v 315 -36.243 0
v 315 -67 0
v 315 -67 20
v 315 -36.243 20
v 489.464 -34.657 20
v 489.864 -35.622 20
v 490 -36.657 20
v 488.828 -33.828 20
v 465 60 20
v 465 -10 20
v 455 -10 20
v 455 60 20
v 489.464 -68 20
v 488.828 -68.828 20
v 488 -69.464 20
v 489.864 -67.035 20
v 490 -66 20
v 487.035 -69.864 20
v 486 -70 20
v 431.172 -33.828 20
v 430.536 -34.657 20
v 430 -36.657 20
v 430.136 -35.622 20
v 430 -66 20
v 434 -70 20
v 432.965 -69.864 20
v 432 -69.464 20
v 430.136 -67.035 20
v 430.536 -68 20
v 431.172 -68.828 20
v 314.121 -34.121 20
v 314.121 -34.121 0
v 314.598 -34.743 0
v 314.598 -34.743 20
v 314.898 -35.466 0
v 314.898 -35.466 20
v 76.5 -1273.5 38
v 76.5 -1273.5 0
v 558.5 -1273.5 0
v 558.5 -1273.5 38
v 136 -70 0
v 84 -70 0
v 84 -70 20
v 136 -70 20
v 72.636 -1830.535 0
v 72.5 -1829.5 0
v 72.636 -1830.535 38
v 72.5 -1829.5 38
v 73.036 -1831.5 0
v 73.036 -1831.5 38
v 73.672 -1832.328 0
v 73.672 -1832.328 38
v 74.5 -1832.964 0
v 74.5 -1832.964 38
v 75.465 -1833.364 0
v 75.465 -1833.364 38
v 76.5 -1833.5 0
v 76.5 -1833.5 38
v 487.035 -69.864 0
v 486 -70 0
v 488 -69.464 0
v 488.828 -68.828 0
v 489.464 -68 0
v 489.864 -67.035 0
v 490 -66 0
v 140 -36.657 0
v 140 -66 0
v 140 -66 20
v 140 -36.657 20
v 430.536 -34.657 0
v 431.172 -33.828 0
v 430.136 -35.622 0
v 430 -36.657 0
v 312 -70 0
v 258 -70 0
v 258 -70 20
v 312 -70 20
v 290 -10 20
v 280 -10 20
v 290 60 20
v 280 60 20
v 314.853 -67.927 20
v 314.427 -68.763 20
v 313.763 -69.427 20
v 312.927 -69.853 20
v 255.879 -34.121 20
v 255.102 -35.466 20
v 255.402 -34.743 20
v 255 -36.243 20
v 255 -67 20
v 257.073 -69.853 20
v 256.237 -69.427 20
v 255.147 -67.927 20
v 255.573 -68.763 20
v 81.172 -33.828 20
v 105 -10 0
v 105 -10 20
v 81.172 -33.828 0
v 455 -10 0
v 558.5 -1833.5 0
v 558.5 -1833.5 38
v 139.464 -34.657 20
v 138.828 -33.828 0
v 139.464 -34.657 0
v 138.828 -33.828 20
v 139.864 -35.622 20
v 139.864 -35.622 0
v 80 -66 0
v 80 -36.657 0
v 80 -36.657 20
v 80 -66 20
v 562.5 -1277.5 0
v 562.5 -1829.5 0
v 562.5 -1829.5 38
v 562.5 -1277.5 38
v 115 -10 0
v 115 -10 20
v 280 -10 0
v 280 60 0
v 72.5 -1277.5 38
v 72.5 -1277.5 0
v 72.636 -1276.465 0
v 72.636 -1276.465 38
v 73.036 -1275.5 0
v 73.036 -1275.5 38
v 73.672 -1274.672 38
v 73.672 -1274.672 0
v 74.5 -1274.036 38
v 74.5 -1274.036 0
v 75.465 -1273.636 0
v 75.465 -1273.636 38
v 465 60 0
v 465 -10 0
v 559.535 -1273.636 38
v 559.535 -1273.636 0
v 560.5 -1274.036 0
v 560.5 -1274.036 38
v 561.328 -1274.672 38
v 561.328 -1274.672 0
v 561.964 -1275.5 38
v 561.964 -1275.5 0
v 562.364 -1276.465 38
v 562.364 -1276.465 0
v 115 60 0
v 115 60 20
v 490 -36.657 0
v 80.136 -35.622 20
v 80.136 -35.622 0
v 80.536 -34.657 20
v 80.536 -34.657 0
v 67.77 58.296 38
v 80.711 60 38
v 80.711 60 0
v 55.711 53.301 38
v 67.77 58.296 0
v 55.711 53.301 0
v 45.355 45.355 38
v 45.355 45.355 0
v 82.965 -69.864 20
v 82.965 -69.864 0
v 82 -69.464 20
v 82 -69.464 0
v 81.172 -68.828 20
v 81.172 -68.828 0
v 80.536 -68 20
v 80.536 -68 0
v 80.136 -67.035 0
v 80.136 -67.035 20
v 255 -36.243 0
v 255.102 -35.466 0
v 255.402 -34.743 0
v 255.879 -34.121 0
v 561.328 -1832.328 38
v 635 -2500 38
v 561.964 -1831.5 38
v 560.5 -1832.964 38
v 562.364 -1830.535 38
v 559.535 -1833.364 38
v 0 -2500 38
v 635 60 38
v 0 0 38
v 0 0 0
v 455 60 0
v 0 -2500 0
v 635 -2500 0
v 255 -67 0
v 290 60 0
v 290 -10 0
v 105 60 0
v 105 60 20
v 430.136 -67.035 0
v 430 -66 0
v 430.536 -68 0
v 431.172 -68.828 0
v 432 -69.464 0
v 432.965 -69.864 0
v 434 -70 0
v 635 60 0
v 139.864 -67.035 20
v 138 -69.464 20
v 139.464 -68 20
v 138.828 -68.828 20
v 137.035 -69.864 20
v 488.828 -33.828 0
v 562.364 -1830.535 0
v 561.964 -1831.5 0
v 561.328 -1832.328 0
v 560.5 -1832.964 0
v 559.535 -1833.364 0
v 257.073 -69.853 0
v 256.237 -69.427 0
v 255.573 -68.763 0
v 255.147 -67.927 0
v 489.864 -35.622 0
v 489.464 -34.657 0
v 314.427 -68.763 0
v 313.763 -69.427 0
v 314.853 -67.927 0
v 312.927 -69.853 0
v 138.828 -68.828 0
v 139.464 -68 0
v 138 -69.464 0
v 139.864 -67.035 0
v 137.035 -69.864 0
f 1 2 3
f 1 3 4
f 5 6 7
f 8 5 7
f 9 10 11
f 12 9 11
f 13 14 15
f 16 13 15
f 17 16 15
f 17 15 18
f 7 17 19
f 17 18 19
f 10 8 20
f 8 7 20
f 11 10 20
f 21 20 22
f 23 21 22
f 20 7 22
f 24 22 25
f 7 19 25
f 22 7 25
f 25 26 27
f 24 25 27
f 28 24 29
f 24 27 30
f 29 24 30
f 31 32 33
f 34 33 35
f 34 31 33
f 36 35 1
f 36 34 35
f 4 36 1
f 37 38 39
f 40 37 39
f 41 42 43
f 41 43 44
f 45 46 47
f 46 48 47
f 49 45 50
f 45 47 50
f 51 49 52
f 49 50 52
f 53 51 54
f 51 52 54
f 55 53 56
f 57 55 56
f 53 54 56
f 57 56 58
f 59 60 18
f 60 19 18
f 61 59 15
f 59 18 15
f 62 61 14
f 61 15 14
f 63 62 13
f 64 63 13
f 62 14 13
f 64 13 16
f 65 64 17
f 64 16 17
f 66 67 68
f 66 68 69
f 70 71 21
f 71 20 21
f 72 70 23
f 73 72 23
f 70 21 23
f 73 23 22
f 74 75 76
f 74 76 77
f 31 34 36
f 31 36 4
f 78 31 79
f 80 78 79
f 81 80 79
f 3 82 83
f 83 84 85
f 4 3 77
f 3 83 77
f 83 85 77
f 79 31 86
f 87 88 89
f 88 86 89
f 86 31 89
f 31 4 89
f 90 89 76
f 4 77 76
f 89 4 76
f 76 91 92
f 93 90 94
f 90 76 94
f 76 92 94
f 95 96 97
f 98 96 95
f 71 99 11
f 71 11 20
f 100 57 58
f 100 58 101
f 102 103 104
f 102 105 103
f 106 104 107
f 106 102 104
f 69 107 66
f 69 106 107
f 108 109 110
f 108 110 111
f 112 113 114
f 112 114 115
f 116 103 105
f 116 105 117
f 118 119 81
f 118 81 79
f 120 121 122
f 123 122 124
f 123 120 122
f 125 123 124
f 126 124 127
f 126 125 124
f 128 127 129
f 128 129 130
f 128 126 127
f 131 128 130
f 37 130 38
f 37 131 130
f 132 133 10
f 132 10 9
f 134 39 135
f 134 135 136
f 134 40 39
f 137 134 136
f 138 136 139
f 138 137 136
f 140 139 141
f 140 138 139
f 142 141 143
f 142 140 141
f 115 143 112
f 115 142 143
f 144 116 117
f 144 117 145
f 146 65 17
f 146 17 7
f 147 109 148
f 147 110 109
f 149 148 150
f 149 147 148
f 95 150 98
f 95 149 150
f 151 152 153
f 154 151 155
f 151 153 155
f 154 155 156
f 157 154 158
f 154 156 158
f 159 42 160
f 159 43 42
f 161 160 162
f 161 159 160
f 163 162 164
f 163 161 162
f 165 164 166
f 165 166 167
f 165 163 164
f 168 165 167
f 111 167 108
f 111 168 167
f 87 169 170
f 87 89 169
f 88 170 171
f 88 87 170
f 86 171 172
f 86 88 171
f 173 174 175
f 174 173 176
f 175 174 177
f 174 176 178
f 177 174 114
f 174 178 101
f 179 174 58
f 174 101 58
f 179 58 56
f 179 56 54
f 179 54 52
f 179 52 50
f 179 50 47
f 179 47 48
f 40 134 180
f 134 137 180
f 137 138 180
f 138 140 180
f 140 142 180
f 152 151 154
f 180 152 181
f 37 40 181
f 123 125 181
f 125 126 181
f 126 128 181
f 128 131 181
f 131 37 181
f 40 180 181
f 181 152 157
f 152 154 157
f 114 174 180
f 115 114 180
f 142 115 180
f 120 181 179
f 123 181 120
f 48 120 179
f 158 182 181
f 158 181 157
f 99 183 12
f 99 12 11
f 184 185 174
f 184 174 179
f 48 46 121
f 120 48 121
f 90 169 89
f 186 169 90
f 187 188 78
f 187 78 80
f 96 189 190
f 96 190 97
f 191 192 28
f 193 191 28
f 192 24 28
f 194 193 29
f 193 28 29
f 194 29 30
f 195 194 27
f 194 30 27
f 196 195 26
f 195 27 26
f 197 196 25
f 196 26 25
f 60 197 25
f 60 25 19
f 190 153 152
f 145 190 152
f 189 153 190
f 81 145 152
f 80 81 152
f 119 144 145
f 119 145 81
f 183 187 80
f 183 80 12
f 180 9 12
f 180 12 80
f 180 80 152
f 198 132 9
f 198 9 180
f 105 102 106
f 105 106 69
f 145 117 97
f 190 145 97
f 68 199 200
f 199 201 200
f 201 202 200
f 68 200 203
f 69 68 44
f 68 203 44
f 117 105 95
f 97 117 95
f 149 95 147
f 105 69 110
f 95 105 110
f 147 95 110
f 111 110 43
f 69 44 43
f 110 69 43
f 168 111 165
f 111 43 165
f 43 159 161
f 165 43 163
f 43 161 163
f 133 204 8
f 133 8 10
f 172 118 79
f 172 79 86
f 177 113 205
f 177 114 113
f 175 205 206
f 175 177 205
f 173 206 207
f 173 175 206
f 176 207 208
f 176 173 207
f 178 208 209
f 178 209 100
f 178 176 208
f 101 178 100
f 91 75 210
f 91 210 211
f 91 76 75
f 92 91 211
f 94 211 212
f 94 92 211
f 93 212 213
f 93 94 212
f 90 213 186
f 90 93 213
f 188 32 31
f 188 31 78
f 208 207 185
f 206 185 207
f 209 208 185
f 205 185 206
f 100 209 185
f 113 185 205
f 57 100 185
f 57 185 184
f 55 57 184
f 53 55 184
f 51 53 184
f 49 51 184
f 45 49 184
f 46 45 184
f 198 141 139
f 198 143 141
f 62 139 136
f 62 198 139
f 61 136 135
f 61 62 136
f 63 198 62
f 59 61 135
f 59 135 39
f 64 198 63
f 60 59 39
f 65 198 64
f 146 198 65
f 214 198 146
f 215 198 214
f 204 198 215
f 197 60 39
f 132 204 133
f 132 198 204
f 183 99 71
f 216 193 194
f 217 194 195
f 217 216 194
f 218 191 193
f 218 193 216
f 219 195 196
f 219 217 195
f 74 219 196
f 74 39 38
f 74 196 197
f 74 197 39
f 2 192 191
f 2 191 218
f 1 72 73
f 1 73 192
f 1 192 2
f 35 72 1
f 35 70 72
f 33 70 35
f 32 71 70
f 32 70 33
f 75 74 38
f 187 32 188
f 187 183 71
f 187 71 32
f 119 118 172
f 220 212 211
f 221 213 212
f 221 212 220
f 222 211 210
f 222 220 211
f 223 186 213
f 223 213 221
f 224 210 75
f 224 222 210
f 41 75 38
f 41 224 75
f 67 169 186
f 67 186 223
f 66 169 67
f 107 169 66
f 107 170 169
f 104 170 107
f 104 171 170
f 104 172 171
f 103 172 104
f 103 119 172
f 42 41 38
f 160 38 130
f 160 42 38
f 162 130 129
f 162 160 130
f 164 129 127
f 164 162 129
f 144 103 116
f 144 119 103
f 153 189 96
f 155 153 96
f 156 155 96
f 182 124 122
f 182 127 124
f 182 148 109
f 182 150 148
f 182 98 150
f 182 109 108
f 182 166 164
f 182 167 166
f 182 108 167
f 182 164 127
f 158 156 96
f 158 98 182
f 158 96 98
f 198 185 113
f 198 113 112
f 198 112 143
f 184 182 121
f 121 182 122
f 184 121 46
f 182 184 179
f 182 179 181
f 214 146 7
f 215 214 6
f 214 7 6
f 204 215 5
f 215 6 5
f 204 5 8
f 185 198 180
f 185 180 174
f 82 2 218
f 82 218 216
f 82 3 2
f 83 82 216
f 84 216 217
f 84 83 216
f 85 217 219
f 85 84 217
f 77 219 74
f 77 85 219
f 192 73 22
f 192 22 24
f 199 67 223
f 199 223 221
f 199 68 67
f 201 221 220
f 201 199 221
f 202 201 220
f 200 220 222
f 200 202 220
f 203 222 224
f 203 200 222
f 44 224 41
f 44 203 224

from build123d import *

# Parameters (mm, degrees)
SKETCH_W     = 490
SKETCH_H     = 560
PAD_DEPTH    = 38
FILLET_R     = 4
POCKET_DEPTH = 20
FILLET001_R  = 4
FILLET002_R  = 4
FILLET003_R  = 3


with BuildPart() as part:
    # Sketch → Pad (new body)
    with BuildSketch(Plane.XY):
        with BuildLine():
            Line((0, 0), (45.355339, 45.355339))
            ThreePointArc((80.710678, 60), (61.576507, 56.193977), (45.355339, 45.355339))
            Line((80.710678, 60), (635, 60))
            Line((635, 60), (635, -2500))
            Line((635, -2500), (0, -2500))
            Line((0, -2500), (0, 0))
        make_face()
        with Locations((317.5, -1553.5)):
            Rectangle(SKETCH_W, SKETCH_H, mode=Mode.SUBTRACT)
    extrude(amount=PAD_DEPTH)

    # Fillet
    fillet_edges = [part.edges().sort_by_distance(p)[0] for p in [
        (562.5, -1833.5, 19),
        (562.5, -1273.5, 19),
        (72.5, -1273.5, 19),
        (72.5, -1833.5, 19),
    ]]
    fillet(fillet_edges, radius=FILLET_R)

    # Sketch001 (on Face2 of Fillet) → Pocket (cut)
    with BuildSketch(Plane(origin=(0, 0, 0), x_dir=(1, 0, 0), z_dir=(0, 0, -1))):
        Polygon((105, -60), (105, 10), (80, 35), (80, 70), (140, 70), (140, 35), (115, 10), (115, -60), align=None)
        Polygon((455, -60), (455, 10), (430, 34.999975), (430, 70), (490, 70), (490, 34.999975), (465, 10), (465, -60), align=None)
        Polygon((280, -60), (280, 10), (255, 34.999975), (255, 70), (315, 70), (315, 34.999975), (290, 10), (290, -60), align=None)
    extrude(amount=-POCKET_DEPTH, mode=Mode.SUBTRACT)

    # Fillet001
    fillet001_edges = [part.edges().sort_by_distance(p)[0] for p in [
        (140, -70, 10),
        (140, -35, 10),
        (80, -35, 10),
        (80, -70, 10),
    ]]
    fillet(fillet001_edges, radius=FILLET001_R)

    # Fillet002
    fillet002_edges = [part.edges().sort_by_distance(p)[0] for p in [
        (430, -70, 10),
        (490, -70, 10),
        (490, -34.999975, 10),
        (430, -34.999975, 10),
    ]]
    fillet(fillet002_edges, radius=FILLET002_R)

    # Fillet003
    fillet003_edges = [part.edges().sort_by_distance(p)[0] for p in [
        (315, -70, 10),
        (255, -70, 10),
        (255, -34.999975, 10),
        (315, -34.999975, 10),
    ]]
    fillet(fillet003_edges, radius=FILLET003_R)


solid = part.part
